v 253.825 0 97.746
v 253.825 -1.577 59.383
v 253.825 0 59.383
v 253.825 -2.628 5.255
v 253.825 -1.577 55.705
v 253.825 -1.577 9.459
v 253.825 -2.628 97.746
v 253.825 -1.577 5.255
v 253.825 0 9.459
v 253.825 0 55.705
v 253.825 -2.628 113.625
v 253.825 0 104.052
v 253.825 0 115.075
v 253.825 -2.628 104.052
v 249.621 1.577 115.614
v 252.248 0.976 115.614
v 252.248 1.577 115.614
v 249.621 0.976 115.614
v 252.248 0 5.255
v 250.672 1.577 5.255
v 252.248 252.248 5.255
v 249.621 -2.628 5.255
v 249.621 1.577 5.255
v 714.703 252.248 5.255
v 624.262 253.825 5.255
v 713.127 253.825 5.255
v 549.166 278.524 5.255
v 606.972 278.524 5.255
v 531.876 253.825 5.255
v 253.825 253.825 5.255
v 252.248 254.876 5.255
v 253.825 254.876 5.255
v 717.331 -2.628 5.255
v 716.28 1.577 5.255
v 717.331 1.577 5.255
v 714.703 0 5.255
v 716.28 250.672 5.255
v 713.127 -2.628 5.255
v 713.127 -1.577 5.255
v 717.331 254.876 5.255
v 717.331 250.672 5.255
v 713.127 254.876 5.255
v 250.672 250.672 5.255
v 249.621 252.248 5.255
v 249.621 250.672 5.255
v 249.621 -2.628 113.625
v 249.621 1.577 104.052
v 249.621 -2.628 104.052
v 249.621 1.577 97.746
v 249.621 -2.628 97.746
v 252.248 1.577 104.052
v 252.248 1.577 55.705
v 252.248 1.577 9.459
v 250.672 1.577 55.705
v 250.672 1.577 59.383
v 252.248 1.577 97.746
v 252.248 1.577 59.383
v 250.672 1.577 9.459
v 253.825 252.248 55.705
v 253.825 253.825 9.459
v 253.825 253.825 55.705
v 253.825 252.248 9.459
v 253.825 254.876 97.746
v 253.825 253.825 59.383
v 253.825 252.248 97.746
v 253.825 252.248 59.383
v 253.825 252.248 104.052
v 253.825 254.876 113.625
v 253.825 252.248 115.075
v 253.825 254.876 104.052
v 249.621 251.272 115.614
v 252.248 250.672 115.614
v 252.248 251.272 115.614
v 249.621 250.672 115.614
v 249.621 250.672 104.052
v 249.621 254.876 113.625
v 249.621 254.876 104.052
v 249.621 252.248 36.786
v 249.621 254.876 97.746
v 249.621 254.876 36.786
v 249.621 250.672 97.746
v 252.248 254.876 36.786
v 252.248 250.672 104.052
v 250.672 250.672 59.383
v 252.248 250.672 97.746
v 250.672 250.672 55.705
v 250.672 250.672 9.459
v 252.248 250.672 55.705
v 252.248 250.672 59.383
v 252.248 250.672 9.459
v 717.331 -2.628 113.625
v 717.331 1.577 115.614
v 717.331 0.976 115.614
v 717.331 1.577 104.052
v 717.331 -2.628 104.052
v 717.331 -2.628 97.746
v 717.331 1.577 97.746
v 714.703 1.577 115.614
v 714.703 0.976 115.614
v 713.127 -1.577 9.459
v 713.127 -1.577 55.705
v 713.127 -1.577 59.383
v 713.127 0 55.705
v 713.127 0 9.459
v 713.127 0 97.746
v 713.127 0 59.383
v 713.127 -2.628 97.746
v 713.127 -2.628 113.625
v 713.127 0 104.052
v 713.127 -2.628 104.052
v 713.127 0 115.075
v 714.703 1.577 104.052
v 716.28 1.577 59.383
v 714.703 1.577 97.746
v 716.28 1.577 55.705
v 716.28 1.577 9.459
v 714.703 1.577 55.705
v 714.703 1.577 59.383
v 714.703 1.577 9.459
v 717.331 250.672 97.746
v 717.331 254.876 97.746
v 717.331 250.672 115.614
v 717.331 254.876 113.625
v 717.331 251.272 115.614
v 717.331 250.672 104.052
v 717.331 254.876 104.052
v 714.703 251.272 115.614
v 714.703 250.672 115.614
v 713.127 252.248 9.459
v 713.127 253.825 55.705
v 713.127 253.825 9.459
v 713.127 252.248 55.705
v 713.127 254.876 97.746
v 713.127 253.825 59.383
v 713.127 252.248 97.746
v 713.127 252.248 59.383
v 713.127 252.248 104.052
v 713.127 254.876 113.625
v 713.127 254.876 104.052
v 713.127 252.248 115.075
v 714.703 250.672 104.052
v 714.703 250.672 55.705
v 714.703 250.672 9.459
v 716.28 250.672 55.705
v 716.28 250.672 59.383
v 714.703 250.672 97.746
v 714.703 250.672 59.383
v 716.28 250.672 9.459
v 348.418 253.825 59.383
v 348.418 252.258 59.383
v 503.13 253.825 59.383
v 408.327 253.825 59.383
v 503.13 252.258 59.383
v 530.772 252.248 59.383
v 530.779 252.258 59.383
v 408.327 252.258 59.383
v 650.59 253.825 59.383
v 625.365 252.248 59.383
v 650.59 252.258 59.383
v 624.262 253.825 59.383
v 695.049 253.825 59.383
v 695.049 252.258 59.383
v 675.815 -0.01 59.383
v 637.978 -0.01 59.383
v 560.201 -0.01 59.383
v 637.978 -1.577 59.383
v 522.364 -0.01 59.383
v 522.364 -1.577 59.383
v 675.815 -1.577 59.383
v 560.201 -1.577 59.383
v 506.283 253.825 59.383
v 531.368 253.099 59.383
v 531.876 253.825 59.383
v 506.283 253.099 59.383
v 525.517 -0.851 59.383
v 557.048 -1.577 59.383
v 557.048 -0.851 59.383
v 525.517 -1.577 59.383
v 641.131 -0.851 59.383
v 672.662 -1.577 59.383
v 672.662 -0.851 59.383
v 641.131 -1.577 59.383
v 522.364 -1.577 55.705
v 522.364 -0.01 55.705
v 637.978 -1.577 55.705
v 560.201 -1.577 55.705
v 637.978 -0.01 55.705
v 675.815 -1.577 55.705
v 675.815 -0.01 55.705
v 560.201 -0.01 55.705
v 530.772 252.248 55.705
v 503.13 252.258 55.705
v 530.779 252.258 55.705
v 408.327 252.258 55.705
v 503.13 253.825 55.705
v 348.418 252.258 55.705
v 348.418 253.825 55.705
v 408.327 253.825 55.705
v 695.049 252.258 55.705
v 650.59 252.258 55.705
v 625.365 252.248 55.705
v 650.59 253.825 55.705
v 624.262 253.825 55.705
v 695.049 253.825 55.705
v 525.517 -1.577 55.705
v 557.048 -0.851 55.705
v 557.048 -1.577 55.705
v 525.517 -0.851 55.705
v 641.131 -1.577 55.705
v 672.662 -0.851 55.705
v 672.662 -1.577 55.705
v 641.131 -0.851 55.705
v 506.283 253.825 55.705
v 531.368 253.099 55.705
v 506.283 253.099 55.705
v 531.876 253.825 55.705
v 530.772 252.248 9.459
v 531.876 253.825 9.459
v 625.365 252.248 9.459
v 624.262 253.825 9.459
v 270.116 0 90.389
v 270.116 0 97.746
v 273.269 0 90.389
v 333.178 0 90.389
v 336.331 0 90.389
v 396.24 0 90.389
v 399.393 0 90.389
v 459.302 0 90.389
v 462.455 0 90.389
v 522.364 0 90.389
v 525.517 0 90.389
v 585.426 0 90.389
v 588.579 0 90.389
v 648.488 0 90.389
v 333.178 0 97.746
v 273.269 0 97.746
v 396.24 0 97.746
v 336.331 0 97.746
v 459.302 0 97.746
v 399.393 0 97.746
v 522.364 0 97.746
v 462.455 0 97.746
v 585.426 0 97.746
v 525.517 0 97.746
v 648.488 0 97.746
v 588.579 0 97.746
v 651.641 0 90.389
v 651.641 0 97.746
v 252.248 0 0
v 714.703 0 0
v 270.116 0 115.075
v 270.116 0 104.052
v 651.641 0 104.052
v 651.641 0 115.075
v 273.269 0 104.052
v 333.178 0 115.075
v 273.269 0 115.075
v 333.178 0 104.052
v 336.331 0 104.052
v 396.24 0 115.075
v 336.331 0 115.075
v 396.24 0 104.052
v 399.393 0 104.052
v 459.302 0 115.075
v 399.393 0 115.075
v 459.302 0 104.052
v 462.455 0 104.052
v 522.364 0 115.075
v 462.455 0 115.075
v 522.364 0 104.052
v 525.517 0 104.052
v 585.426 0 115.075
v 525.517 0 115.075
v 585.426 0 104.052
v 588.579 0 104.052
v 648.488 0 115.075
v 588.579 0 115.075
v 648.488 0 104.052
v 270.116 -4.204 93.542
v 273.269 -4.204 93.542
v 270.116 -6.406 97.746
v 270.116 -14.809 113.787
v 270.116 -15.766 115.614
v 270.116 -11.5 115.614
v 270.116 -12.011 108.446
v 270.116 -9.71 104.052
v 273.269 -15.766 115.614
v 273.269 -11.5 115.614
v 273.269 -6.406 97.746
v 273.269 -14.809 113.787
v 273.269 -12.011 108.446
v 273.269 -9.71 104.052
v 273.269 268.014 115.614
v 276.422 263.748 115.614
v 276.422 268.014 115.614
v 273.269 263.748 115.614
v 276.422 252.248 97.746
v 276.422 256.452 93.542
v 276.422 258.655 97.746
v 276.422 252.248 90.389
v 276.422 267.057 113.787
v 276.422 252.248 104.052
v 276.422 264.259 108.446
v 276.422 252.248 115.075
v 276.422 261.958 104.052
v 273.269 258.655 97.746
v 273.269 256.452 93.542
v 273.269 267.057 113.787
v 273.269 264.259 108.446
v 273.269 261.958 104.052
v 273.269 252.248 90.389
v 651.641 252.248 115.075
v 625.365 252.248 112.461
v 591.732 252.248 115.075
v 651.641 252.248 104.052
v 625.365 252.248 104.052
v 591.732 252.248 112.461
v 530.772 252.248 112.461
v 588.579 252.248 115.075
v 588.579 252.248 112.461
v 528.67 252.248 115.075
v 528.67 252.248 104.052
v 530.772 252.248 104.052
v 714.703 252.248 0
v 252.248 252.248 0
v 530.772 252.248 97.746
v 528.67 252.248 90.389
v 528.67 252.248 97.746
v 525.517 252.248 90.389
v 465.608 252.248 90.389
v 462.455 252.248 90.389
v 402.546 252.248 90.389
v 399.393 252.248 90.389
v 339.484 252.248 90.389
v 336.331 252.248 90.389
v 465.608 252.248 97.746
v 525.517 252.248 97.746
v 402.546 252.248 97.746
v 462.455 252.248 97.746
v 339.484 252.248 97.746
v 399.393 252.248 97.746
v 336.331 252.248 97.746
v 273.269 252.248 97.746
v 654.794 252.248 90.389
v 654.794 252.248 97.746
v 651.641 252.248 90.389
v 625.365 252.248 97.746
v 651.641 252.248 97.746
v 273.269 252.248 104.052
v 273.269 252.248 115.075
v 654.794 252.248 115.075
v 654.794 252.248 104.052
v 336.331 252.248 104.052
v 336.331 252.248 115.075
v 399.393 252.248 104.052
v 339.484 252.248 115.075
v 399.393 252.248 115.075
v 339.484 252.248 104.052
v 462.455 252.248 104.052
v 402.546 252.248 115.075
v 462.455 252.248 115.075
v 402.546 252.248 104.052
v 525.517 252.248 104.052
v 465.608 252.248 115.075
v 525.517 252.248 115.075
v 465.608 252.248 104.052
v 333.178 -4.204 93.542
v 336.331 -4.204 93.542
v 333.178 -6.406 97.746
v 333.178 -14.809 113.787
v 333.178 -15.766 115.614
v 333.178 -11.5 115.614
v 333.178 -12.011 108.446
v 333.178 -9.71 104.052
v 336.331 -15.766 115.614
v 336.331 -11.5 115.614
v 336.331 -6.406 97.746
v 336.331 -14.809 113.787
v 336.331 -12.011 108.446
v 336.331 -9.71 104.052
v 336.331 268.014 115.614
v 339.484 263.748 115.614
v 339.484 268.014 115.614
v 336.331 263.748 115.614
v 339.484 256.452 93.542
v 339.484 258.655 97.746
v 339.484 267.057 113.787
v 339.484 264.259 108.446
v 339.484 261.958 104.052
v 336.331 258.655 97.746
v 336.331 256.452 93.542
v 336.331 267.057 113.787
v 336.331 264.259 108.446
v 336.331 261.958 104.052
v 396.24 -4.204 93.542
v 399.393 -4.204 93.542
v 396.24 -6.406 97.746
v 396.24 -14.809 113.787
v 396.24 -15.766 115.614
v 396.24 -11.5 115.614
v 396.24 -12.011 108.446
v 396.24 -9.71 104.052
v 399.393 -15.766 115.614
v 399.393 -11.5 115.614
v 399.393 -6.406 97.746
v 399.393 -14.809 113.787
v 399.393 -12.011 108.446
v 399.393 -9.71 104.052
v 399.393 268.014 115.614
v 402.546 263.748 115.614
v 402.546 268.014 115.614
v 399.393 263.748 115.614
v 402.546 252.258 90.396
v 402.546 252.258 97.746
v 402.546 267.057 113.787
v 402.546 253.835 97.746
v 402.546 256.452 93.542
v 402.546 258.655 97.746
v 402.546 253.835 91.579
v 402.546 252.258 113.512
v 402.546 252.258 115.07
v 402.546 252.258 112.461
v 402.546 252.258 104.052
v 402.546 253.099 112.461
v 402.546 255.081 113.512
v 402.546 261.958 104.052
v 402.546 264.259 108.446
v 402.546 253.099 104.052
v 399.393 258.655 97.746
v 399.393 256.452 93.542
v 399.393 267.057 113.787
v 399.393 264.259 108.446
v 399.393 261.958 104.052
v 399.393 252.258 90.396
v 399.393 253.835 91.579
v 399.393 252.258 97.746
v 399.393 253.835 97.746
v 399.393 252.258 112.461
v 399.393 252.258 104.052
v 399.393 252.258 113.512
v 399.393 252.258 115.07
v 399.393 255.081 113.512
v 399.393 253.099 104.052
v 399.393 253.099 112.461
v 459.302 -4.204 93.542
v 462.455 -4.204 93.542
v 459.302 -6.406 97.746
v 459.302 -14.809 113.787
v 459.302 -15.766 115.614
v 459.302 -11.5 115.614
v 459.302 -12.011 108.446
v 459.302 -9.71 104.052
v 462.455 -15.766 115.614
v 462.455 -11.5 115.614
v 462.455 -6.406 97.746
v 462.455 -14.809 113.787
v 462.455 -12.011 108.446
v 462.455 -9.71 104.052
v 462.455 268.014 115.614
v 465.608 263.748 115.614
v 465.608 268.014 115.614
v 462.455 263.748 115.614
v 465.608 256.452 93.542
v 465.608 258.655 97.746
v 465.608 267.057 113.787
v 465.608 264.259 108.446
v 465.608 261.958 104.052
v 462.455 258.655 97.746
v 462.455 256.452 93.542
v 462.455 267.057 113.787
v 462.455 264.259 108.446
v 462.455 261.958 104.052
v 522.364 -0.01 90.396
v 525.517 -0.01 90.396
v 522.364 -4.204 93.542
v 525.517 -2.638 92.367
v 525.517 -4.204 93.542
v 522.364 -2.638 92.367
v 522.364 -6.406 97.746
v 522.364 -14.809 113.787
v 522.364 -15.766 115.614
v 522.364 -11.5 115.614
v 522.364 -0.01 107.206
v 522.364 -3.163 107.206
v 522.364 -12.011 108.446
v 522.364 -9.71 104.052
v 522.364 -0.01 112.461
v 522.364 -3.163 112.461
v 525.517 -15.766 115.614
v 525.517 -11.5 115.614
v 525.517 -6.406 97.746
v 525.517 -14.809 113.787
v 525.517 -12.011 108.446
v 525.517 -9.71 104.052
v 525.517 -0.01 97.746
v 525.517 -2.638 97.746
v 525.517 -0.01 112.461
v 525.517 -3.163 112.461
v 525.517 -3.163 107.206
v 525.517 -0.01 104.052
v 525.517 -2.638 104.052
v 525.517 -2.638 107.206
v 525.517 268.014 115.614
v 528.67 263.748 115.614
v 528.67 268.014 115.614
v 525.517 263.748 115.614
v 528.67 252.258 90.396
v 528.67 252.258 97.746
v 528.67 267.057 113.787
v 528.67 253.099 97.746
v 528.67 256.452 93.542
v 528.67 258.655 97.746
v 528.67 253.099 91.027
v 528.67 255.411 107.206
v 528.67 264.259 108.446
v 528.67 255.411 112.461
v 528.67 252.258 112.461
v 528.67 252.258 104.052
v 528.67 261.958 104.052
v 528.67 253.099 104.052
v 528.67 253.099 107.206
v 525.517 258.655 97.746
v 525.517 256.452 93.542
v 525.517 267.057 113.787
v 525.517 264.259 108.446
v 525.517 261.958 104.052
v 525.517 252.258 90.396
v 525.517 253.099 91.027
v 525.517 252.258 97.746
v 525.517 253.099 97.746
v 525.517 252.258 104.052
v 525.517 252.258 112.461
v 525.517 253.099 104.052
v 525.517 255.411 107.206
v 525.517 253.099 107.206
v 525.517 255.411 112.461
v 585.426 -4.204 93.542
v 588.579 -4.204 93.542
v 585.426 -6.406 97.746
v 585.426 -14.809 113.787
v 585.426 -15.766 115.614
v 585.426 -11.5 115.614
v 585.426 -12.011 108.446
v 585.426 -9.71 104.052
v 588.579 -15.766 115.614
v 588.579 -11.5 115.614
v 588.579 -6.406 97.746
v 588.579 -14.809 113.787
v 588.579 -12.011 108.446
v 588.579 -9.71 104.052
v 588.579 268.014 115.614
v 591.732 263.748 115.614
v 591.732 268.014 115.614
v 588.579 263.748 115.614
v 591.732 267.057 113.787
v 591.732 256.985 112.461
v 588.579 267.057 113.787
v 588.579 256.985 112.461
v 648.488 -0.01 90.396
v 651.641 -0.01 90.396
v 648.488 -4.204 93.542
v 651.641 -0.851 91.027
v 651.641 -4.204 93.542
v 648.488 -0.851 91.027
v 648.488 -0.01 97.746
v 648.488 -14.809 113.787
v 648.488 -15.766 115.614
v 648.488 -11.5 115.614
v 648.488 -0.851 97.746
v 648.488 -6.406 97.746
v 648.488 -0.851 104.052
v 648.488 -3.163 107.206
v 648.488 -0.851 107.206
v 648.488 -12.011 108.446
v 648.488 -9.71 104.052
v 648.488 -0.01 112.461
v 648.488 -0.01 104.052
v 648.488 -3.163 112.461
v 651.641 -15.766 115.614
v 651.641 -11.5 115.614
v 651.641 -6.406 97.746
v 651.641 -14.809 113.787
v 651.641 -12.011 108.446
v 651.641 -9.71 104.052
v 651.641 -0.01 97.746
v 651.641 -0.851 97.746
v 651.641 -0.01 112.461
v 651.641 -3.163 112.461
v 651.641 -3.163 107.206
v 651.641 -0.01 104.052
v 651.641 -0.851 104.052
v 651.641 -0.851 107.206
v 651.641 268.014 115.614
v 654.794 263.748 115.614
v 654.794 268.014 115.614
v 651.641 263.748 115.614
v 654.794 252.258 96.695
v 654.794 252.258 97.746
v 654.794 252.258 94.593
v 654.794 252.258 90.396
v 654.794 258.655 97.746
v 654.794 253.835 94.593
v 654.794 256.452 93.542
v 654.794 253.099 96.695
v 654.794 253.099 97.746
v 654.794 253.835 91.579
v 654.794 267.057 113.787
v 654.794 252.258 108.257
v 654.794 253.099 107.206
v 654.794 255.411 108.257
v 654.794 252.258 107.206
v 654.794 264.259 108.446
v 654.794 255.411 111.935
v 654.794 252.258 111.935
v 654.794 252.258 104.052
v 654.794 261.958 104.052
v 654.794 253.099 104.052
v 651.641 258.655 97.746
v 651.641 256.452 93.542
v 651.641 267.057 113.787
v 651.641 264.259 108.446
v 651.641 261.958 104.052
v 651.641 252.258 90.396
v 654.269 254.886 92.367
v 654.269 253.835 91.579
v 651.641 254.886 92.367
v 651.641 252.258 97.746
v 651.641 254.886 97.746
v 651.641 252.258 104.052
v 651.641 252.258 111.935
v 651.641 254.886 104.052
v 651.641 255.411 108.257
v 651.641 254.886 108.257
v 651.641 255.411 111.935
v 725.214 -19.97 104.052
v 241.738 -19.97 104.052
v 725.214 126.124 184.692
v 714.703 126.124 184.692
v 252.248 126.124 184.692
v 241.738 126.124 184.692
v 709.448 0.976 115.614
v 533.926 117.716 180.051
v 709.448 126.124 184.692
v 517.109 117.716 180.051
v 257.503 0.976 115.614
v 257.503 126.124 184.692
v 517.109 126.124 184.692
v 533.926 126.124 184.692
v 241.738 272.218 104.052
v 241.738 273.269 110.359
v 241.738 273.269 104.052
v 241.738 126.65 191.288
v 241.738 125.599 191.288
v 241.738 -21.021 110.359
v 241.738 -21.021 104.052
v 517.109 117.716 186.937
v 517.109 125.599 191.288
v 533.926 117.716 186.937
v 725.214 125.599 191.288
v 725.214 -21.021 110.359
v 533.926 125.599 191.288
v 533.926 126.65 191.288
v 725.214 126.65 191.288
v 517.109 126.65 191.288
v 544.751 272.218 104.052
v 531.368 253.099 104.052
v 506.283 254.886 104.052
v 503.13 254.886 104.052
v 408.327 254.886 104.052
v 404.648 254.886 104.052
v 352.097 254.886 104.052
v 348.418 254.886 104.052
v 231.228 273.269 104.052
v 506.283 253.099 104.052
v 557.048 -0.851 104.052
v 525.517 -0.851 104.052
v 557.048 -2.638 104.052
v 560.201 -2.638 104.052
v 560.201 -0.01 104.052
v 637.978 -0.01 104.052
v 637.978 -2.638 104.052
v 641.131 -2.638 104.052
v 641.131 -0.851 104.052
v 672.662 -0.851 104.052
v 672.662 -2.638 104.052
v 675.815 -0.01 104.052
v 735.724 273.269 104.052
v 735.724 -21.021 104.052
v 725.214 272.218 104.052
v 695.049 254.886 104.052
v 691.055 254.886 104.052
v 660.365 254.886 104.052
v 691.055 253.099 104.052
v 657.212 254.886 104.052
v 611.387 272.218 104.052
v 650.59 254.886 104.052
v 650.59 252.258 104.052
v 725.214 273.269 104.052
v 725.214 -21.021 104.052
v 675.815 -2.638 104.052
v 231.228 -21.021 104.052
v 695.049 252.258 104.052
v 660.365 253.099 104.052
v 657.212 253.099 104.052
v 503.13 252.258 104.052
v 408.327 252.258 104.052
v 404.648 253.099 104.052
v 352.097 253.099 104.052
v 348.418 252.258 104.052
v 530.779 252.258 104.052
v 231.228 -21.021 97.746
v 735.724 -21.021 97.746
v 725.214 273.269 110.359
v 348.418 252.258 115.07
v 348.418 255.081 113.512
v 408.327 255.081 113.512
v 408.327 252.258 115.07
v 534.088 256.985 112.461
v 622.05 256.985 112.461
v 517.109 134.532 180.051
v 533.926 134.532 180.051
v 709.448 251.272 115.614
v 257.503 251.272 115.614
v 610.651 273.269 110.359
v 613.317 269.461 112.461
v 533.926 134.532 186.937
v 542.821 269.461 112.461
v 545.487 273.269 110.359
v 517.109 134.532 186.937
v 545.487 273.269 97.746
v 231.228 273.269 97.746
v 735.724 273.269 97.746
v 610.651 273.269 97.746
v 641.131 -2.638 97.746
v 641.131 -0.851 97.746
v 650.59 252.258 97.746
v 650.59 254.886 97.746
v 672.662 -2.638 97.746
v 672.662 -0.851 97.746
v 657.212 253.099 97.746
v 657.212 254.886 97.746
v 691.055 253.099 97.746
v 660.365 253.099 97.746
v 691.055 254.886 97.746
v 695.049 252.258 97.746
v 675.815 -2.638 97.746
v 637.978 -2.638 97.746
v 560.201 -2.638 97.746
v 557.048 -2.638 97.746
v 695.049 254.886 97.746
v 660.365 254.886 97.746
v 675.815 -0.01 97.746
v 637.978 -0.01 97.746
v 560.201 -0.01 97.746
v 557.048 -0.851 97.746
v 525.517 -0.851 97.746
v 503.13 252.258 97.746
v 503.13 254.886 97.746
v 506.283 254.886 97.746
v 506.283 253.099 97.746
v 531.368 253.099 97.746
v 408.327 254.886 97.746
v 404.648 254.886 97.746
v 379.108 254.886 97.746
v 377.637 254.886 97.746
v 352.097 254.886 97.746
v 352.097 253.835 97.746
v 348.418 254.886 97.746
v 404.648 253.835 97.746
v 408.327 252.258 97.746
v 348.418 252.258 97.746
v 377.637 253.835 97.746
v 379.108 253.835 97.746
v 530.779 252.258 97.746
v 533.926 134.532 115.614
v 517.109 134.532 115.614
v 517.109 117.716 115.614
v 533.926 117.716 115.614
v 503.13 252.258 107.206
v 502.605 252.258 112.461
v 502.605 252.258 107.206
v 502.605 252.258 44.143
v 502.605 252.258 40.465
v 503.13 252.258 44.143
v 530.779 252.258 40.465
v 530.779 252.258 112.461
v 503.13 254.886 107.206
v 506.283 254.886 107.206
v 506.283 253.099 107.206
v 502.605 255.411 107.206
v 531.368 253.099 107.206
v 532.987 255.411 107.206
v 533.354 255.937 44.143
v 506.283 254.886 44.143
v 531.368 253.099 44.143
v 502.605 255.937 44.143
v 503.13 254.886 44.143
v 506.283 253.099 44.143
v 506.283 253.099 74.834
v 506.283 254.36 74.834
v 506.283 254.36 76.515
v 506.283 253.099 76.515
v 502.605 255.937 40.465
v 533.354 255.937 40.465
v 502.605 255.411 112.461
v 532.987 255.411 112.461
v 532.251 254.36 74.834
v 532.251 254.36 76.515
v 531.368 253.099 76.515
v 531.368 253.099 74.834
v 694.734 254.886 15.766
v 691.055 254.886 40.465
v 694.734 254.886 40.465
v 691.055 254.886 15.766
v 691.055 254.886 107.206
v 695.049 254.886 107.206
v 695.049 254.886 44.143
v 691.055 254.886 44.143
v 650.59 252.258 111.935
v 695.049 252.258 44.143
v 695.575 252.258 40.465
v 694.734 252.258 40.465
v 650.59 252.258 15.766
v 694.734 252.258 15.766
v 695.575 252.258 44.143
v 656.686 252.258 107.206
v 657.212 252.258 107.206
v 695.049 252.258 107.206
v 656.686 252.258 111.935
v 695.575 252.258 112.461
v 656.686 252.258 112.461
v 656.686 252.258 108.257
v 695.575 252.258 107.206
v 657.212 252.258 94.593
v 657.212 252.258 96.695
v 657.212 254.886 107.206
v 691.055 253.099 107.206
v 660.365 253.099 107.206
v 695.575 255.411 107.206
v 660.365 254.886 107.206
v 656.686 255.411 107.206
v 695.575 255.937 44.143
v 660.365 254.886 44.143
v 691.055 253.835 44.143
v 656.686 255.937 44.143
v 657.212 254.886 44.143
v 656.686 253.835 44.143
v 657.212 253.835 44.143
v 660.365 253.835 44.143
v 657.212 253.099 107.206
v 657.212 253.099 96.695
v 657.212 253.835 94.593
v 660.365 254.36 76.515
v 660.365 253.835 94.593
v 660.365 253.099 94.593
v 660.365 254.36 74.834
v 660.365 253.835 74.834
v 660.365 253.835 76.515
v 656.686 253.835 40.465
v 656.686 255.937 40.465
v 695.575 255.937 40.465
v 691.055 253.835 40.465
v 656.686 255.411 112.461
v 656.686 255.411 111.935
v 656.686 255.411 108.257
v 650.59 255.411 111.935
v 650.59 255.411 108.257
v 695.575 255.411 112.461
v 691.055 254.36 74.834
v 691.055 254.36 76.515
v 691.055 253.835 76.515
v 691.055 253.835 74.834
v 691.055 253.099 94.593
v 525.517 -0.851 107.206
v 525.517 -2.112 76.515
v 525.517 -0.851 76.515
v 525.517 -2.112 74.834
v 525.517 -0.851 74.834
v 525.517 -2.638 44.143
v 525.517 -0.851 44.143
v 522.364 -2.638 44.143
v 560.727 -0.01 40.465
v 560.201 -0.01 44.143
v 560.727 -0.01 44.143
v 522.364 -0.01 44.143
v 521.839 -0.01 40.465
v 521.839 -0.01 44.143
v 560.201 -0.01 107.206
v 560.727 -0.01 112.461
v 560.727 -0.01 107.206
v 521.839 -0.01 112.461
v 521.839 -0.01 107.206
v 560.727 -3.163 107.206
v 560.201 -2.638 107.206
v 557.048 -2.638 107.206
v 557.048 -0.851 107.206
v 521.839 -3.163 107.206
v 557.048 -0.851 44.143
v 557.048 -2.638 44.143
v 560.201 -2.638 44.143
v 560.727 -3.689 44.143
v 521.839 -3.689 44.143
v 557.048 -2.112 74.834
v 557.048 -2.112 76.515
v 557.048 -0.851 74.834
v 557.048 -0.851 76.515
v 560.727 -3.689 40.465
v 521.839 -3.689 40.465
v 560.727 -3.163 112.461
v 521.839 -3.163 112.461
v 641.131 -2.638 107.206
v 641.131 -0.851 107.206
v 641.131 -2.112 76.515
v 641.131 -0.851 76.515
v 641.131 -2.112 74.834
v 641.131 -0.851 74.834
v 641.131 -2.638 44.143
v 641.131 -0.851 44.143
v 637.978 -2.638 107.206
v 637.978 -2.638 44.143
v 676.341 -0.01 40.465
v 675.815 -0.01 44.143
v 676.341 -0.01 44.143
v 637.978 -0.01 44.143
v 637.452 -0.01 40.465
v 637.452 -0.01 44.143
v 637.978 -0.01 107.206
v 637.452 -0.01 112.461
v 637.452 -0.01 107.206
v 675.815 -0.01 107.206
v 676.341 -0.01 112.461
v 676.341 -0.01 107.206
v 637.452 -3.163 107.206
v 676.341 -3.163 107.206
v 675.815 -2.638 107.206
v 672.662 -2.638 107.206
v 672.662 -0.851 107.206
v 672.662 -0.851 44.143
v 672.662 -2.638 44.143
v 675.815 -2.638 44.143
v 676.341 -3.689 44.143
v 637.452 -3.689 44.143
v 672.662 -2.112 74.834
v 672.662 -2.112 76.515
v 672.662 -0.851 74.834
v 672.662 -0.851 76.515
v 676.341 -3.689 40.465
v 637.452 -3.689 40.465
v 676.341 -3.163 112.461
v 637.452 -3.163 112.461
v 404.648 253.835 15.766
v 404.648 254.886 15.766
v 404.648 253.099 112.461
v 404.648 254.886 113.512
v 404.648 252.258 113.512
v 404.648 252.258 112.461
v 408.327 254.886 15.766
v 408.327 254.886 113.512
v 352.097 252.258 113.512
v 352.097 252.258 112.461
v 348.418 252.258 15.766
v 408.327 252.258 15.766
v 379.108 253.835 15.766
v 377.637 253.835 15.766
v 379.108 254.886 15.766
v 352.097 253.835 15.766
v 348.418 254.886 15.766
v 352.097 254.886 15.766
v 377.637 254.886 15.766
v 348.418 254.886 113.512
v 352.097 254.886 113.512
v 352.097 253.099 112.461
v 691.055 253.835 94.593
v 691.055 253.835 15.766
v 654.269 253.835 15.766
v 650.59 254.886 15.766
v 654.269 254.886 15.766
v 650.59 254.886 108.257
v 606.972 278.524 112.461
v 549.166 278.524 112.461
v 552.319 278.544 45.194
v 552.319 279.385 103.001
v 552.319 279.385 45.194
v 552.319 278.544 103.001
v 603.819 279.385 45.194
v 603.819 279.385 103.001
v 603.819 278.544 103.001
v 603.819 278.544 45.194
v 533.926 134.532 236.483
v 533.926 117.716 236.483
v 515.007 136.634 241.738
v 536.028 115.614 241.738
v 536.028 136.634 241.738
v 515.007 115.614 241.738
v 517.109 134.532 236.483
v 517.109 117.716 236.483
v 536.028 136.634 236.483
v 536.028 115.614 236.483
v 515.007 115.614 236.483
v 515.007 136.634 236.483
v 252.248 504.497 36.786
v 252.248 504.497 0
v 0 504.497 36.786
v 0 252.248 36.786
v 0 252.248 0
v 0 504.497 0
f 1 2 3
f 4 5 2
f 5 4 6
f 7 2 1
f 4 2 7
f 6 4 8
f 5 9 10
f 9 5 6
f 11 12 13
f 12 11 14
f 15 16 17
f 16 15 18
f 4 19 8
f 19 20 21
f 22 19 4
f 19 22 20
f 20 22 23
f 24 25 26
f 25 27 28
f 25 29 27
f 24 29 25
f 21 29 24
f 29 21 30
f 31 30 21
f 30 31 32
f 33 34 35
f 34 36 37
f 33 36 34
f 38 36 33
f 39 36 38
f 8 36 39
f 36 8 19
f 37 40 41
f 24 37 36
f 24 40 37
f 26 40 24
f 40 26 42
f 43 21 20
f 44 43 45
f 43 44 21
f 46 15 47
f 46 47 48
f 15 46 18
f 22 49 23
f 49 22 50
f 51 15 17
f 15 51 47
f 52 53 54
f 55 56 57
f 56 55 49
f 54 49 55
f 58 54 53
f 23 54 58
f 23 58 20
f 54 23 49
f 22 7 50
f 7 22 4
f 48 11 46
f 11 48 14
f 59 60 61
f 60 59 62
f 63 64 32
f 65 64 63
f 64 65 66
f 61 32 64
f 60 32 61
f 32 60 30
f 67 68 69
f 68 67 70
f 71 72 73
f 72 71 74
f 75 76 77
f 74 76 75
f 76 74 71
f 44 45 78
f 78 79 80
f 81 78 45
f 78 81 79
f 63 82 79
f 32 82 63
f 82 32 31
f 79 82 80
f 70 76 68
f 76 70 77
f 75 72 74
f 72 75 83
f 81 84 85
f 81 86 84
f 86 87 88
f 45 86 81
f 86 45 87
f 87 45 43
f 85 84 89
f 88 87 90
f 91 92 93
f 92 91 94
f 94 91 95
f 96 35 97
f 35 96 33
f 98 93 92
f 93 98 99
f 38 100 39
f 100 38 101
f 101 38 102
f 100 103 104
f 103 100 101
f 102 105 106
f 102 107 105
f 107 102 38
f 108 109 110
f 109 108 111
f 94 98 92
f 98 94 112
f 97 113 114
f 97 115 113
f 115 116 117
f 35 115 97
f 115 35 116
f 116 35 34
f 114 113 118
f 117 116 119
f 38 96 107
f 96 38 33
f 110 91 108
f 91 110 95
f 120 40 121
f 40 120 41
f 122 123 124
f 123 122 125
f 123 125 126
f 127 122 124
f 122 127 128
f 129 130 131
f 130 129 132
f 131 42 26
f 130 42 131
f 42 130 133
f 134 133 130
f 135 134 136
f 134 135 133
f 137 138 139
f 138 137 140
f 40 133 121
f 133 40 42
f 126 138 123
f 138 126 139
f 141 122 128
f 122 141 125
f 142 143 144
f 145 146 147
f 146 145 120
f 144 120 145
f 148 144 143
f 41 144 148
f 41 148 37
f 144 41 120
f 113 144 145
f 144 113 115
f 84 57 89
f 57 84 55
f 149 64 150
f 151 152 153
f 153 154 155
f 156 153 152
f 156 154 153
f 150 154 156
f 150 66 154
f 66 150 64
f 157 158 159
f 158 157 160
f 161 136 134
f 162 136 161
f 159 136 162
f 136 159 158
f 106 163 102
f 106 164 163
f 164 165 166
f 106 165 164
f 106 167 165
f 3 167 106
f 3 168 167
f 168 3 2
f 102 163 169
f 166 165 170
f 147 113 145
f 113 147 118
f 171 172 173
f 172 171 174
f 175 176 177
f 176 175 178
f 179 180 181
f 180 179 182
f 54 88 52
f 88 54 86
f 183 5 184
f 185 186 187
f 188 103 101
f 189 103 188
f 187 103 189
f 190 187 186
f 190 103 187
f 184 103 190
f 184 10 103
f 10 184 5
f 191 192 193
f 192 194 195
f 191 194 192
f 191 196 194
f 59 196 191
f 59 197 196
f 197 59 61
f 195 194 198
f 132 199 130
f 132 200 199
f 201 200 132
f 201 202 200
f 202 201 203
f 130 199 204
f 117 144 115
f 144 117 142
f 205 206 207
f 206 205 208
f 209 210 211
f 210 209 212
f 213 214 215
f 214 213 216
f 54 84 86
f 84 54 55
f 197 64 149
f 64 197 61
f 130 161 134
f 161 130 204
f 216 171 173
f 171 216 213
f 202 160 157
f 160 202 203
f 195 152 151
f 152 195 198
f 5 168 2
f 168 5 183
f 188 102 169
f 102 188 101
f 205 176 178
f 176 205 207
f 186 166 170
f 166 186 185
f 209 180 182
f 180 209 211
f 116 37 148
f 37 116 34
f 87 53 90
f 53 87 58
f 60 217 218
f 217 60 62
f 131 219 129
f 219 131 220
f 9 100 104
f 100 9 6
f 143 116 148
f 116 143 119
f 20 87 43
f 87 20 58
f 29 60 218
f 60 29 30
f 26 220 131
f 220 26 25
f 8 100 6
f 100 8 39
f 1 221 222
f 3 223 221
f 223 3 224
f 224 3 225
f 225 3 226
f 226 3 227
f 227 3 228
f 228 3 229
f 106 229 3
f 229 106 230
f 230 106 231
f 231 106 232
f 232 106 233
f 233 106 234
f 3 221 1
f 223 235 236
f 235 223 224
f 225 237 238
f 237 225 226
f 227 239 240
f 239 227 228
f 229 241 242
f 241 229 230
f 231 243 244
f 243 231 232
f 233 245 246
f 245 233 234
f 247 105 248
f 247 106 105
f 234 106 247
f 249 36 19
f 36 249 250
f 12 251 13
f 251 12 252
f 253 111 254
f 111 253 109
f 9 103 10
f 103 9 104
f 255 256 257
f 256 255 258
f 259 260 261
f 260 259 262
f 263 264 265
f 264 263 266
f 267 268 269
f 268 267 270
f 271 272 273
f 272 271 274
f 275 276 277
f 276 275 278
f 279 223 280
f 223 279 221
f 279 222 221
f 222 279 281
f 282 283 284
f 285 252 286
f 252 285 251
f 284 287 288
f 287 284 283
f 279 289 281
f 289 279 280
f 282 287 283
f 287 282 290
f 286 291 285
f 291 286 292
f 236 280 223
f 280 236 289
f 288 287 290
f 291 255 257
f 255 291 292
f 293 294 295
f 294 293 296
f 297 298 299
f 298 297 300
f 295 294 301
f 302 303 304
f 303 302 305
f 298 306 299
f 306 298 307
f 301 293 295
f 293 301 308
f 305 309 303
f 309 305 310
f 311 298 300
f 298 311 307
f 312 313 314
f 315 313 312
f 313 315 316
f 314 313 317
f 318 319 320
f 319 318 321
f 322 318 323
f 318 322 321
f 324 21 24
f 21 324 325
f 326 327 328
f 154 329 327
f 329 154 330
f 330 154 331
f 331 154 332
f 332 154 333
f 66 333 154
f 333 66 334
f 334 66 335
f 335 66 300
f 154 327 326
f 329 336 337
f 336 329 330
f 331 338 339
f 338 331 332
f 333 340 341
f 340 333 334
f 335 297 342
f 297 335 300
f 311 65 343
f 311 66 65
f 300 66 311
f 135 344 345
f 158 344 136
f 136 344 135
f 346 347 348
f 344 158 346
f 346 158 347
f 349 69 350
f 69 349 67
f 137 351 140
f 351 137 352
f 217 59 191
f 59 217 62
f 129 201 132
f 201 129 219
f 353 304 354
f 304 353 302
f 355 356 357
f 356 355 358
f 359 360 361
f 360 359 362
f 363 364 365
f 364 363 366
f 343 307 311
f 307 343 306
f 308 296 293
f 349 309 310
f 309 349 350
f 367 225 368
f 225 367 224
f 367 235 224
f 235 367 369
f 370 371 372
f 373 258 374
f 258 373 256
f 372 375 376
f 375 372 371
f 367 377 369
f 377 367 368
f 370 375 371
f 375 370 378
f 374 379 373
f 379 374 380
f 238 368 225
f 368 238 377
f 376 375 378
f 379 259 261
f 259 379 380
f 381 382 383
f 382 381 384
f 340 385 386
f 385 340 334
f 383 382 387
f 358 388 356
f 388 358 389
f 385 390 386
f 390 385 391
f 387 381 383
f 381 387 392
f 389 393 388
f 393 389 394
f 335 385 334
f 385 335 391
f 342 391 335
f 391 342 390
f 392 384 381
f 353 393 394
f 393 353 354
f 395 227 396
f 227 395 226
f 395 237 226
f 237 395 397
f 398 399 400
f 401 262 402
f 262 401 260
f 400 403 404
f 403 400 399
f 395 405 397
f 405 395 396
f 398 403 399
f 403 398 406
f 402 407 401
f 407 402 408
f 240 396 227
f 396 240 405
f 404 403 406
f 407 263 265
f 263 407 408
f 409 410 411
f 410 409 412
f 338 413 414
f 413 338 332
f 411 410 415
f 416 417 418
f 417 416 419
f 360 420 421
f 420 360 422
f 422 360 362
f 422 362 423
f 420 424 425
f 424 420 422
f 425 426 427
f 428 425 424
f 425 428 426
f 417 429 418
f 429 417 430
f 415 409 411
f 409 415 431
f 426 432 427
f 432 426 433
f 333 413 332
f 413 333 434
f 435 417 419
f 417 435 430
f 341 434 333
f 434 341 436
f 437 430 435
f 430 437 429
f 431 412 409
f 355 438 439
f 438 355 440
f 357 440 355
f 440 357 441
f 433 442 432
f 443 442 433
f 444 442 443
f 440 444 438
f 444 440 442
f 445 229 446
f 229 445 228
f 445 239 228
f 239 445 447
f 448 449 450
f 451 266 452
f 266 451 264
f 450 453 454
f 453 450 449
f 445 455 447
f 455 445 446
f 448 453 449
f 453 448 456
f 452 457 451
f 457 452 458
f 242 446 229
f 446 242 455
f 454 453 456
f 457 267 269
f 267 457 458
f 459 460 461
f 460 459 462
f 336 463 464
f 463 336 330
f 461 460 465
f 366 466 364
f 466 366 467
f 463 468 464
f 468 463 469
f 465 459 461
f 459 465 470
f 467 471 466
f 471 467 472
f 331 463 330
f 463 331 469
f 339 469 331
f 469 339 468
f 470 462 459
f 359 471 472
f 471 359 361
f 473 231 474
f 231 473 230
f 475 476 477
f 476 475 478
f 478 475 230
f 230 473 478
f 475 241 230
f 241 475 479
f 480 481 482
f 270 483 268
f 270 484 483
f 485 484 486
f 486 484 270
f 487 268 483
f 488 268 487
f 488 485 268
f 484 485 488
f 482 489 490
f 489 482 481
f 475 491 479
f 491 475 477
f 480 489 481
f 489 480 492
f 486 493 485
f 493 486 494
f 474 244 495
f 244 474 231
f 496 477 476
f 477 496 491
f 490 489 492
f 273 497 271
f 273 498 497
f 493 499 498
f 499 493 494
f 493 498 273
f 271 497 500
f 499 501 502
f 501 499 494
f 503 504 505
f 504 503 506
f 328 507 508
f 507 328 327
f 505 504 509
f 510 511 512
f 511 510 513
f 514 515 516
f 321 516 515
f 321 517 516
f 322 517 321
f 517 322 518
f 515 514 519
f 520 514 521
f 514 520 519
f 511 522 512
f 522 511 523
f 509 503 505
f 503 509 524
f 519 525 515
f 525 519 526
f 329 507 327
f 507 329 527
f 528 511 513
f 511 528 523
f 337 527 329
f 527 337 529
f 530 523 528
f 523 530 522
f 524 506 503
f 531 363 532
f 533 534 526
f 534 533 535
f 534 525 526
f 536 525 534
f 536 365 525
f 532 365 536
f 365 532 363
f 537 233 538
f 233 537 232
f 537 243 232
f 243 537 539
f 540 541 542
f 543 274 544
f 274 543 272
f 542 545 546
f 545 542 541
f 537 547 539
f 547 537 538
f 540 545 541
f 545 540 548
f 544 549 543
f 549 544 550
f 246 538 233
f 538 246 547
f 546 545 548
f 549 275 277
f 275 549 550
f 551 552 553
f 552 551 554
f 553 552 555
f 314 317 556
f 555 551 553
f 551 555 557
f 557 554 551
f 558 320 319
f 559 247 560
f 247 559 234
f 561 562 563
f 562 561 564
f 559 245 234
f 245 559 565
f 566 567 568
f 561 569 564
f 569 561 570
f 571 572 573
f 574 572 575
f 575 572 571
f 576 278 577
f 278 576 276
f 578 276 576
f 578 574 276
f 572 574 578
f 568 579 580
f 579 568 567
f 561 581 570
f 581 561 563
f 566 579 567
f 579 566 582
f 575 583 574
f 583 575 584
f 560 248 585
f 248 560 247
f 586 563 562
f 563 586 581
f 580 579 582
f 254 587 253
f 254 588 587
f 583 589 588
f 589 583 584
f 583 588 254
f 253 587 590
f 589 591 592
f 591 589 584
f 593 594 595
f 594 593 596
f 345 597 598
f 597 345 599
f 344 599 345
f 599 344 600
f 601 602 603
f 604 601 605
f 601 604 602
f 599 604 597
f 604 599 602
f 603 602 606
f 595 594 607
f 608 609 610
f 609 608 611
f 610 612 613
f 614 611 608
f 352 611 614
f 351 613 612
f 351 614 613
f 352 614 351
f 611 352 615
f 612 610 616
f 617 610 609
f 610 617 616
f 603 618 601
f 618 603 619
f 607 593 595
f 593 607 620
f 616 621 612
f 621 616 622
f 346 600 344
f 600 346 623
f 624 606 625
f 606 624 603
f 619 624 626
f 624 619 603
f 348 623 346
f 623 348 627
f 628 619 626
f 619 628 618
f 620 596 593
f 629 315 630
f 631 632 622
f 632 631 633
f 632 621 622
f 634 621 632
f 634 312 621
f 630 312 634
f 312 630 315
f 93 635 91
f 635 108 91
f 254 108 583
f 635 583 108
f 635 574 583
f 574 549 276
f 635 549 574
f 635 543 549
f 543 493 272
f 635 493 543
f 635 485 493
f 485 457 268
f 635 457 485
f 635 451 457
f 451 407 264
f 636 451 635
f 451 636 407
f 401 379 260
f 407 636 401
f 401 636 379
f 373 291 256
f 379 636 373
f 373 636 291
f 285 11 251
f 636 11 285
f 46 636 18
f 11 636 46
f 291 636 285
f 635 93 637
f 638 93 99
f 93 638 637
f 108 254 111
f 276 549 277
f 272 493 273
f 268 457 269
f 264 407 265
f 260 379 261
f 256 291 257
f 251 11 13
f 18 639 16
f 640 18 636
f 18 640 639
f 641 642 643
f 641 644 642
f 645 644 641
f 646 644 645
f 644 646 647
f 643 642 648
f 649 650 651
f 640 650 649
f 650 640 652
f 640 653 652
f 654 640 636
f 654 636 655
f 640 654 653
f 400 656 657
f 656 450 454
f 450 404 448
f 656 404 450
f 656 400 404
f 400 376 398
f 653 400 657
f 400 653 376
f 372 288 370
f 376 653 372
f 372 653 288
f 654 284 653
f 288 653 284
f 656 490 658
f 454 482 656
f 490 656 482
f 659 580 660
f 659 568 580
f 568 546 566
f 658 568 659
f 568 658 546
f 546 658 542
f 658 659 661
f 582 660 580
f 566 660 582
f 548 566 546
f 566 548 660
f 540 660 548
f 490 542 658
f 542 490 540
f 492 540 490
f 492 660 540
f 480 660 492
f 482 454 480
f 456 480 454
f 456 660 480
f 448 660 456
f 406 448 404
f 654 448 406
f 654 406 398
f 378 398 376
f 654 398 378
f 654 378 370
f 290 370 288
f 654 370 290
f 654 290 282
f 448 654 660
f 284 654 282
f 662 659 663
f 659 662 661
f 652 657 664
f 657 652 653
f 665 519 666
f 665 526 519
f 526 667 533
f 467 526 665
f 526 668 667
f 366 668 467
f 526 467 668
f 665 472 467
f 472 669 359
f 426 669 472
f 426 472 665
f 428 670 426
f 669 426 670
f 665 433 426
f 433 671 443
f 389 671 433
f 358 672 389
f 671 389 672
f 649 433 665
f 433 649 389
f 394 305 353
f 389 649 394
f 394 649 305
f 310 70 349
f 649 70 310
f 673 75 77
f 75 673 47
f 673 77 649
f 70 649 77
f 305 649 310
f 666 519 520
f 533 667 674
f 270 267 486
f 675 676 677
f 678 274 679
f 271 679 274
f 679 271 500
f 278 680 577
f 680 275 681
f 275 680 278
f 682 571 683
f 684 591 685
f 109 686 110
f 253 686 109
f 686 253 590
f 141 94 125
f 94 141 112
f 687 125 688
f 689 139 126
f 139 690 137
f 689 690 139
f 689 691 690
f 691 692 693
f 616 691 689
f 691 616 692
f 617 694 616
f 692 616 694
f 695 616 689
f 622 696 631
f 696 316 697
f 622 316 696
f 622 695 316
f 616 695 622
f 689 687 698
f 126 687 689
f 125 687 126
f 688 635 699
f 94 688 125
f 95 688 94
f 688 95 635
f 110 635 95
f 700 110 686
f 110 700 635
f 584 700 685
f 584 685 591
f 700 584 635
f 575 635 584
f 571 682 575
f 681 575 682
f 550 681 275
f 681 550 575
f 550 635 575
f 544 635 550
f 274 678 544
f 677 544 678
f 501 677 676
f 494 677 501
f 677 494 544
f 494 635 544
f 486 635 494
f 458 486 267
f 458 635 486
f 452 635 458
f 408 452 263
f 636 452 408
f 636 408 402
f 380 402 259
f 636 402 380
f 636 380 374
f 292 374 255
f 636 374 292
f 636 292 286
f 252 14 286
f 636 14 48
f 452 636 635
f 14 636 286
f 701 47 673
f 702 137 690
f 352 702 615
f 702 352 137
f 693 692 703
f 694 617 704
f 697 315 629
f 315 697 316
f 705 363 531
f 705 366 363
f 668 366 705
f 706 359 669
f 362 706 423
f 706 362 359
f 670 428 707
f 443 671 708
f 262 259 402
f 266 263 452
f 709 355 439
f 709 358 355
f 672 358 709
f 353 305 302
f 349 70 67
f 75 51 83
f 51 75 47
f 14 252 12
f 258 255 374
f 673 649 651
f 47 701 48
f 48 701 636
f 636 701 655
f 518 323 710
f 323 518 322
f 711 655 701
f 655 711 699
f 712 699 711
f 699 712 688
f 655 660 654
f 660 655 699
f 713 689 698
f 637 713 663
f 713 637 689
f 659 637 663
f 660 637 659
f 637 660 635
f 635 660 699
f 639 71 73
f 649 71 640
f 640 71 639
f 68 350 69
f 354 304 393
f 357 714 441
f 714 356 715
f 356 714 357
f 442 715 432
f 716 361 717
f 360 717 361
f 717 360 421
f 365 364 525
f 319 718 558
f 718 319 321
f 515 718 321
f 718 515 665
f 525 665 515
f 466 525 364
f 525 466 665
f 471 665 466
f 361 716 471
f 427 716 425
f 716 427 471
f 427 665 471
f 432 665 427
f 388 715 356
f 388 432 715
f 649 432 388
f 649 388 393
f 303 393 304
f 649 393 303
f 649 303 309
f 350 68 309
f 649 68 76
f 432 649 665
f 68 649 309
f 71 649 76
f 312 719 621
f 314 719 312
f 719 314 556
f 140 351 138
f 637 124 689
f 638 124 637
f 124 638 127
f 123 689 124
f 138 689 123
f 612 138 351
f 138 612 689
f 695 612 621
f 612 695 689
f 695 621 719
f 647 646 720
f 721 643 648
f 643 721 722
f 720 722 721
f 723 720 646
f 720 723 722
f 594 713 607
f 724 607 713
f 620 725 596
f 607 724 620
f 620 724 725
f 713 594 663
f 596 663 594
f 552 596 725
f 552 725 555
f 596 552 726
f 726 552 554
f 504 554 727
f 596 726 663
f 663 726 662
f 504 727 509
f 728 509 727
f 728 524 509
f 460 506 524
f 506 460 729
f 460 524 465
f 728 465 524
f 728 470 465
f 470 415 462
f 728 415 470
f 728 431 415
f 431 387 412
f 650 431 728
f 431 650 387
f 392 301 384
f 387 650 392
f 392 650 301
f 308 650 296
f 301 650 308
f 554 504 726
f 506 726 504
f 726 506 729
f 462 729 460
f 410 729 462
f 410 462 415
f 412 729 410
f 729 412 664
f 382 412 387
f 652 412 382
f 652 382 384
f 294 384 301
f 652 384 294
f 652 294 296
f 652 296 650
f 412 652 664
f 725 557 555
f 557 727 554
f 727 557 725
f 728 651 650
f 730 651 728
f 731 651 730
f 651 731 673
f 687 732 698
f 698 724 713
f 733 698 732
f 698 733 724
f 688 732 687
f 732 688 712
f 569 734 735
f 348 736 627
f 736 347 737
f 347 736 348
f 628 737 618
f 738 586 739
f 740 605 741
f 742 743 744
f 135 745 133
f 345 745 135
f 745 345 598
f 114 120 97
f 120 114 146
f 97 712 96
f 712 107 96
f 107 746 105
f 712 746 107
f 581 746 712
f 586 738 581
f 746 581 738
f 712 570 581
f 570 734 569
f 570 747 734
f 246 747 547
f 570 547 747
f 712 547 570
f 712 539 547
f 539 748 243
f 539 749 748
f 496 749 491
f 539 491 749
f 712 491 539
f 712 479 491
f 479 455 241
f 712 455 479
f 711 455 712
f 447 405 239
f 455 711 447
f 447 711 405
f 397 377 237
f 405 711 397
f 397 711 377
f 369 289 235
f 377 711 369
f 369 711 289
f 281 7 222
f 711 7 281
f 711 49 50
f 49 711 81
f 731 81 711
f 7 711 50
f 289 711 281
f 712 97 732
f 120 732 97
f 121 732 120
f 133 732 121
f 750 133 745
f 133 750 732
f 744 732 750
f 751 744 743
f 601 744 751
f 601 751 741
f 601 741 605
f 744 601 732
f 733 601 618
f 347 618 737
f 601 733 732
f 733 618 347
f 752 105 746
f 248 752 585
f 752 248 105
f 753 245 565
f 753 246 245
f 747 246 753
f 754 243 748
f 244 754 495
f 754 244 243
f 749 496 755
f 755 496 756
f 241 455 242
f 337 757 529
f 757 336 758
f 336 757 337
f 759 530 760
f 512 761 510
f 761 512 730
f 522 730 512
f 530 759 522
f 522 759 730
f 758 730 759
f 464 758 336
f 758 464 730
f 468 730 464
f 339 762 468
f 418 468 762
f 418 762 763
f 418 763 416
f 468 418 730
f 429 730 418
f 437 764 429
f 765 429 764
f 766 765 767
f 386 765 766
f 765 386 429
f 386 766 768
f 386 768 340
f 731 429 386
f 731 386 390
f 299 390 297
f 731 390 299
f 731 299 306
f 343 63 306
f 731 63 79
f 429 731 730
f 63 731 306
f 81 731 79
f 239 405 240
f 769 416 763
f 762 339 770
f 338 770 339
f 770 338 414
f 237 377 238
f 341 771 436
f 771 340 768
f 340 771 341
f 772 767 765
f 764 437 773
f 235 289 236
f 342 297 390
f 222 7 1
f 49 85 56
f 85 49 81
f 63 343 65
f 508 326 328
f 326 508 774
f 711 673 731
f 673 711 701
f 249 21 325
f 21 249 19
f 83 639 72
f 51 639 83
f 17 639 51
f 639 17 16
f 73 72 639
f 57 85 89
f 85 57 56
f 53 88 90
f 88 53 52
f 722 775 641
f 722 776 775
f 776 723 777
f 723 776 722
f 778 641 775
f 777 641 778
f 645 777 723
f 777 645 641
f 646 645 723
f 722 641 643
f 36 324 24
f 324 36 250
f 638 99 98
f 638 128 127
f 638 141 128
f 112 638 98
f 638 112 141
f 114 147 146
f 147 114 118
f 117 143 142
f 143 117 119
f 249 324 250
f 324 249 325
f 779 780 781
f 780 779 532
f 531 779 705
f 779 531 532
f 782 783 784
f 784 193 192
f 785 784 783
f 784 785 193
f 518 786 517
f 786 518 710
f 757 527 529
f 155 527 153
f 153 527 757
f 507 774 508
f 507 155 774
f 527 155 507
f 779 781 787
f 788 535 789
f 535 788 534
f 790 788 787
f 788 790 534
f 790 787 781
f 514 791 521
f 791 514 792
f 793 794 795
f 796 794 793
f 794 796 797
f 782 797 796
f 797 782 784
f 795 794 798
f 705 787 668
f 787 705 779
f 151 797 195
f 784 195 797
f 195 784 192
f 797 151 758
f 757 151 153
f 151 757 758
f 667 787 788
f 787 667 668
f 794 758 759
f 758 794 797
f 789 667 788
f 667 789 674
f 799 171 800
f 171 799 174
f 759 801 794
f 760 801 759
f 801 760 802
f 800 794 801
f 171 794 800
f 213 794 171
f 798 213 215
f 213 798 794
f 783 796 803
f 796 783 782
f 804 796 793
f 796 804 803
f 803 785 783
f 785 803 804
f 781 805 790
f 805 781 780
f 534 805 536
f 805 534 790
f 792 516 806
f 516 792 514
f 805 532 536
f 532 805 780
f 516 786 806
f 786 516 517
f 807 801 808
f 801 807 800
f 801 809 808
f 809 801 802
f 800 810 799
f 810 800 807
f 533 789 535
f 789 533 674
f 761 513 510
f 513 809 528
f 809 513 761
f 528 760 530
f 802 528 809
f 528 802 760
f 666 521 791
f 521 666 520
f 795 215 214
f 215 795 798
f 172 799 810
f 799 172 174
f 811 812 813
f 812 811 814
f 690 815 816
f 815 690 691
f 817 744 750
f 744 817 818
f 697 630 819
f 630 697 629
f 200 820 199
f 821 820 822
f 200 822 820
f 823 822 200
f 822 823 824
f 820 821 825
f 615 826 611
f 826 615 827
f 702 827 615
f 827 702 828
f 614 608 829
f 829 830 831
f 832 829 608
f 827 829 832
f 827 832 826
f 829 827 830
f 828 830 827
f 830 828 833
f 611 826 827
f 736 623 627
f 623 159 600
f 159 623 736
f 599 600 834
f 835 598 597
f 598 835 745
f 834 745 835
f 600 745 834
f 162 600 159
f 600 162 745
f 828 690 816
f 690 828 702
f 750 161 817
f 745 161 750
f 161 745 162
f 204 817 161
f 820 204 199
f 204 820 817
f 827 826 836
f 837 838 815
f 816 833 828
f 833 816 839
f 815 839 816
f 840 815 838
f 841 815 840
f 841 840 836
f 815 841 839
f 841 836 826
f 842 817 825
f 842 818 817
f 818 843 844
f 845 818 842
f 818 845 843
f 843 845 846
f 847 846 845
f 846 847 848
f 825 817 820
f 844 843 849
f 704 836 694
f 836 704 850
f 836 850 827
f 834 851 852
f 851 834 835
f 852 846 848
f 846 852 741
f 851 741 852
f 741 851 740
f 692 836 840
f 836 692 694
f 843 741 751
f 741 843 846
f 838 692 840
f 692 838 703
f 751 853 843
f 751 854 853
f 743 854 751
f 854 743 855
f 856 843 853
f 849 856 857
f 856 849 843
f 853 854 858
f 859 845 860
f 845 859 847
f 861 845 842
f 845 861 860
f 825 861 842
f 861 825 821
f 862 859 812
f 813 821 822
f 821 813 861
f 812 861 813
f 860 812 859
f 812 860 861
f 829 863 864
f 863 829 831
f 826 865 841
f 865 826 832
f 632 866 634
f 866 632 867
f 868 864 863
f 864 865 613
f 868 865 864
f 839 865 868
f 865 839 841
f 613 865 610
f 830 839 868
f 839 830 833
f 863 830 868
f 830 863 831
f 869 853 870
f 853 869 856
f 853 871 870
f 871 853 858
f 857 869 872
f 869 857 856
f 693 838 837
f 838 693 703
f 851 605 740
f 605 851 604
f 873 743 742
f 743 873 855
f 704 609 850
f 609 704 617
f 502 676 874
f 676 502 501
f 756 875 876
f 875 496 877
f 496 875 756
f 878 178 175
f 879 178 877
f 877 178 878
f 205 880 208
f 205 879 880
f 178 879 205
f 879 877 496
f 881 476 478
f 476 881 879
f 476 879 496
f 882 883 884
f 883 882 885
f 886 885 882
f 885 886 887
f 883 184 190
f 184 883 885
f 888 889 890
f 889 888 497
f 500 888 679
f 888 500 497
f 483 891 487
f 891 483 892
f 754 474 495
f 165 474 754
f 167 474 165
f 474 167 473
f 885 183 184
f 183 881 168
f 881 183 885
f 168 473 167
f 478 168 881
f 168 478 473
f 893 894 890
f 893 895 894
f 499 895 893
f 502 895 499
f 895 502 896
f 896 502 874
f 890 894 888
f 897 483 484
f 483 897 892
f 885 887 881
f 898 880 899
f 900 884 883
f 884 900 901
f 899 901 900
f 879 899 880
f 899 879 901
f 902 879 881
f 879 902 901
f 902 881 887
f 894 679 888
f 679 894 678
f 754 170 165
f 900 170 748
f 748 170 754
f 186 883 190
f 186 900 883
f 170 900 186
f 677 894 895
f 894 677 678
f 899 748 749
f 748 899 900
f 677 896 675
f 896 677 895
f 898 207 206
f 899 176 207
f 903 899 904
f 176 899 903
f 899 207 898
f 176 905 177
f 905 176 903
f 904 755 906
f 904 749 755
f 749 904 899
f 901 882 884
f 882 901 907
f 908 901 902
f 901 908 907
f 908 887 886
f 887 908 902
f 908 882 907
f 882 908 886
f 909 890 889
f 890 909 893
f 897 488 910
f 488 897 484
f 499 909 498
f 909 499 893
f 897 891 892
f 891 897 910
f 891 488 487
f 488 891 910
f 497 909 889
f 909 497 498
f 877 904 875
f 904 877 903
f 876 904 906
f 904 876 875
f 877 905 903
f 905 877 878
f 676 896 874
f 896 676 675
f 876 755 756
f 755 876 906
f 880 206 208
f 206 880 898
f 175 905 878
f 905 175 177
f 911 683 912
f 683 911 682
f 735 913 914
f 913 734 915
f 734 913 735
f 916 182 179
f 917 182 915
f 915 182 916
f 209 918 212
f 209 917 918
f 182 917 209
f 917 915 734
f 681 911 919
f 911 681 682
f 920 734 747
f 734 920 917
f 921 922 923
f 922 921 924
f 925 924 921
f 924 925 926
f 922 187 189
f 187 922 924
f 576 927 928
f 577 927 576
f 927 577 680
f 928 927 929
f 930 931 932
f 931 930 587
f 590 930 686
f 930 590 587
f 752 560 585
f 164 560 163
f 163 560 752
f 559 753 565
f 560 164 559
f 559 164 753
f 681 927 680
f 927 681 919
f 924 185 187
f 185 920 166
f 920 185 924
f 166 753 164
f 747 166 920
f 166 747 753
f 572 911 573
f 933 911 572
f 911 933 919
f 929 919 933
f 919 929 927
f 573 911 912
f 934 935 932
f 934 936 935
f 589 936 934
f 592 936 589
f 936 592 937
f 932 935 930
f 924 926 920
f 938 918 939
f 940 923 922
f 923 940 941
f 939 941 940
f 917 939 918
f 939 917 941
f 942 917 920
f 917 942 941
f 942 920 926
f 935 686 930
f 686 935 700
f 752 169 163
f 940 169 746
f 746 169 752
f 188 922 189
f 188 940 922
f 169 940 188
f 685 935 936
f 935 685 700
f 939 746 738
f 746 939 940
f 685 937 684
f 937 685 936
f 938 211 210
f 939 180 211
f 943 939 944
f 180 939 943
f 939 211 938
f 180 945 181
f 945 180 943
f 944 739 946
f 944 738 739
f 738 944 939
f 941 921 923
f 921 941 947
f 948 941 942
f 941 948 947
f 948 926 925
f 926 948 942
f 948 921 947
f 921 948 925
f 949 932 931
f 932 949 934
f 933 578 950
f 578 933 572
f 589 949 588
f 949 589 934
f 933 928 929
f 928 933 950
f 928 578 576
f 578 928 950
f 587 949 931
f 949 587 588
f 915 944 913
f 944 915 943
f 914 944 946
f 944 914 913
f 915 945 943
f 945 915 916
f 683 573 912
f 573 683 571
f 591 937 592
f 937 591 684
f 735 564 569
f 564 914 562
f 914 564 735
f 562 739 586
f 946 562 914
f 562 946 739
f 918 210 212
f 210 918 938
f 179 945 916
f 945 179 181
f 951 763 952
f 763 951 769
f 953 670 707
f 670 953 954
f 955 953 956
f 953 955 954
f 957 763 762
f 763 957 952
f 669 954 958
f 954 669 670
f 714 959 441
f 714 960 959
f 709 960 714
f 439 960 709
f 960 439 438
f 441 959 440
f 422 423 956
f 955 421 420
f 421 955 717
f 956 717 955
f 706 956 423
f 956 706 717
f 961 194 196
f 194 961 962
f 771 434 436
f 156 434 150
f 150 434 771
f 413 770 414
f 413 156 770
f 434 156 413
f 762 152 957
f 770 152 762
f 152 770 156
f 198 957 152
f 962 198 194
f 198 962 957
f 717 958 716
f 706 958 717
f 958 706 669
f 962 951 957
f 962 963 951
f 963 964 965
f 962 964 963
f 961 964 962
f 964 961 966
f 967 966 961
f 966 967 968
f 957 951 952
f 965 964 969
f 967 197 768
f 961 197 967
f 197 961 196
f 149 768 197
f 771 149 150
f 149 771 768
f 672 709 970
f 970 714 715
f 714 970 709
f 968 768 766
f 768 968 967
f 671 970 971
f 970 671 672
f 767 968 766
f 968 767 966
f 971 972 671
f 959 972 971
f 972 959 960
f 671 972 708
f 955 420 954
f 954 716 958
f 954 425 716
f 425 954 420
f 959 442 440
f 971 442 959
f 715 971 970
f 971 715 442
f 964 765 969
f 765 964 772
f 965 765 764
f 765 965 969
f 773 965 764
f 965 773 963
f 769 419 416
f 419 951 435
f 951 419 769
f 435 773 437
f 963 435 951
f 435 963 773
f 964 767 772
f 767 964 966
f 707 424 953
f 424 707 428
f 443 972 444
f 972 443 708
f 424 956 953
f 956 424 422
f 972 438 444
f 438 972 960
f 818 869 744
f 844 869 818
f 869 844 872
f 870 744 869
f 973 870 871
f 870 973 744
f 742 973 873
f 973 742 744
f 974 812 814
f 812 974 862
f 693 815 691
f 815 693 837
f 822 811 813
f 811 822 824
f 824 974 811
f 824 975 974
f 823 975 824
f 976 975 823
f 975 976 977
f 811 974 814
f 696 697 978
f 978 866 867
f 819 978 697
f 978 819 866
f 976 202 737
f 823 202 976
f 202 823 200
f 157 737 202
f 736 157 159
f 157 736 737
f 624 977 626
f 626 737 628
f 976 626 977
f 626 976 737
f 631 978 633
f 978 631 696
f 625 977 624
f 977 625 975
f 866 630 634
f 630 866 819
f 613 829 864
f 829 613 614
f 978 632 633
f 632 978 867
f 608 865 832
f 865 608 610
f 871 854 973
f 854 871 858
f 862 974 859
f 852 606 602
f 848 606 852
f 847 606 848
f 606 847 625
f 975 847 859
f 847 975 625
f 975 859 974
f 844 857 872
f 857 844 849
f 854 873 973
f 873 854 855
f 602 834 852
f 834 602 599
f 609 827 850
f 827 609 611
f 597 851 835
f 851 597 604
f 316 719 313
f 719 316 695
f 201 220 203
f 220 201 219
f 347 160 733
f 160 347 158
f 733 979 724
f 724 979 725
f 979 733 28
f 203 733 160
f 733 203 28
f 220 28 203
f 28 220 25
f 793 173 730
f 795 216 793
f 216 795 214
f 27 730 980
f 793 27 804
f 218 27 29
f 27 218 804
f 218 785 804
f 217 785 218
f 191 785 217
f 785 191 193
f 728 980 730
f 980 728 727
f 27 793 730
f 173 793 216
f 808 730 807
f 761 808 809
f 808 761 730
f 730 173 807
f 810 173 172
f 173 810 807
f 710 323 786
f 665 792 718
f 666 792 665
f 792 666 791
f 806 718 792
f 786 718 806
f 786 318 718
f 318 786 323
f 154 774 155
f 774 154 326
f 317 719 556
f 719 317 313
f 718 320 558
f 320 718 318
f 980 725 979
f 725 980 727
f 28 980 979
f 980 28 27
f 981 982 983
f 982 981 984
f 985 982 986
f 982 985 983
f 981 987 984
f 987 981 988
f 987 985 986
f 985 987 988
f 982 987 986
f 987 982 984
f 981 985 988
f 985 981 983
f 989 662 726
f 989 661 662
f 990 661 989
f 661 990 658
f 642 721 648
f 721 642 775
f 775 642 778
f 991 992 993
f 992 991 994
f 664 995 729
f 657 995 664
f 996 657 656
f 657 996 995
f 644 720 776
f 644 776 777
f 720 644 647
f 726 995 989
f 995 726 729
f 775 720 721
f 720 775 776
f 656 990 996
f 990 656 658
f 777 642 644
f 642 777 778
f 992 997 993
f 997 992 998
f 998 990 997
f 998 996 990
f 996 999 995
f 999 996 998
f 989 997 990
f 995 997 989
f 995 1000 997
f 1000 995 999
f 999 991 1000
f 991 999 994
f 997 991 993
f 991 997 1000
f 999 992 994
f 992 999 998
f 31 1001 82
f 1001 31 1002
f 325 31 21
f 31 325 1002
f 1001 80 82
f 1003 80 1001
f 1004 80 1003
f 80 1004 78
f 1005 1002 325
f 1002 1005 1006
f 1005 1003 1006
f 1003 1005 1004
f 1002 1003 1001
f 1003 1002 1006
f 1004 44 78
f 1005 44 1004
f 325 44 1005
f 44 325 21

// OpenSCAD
// =====================================================================
//  MILWAUKEE ROAD - JUDA, WIS. PASSENGER STATION
//  Source: Album sheet 124, drawing B-?, June 1 1928.  Drawings are private reference (in copyright):
//  Research Library / RSW / Stations / Standard depots / Album of Depot Plans 1919.
//  Rib Side Works, 24 Nov 2026. FIRST SHAPE MODEL for review - not cut into print sections.
//  KNOWN (from the sheet): 44 x 24 ft depot + 24 ft exterior high platform; baggage and freight room, waiting room, ticket office with bay; drop siding, gable roof.
//  ESTIMATE: wall and ridge heights where not written, window count and spacing, colours.
//  Built with the shared depot builder ../../../_common/rsw_depot.scad (x along the track,
//  y = 0 town side, track side +y, feet).  SCALE: 29 = G, 48 = O, 87 = HO.
// =====================================================================
SCALE = 29;
include <../../../_common/rsw_depot.scad>

depot(blocks = [[24, 44, 0, 24, 11, 0.55, 1, 2, 0]],
      pavs   = [],
      wins   = [[49.67, 1, 3, 6, 4.2], [57.0, 1, 3, 6, 4.2], [64.33, 1, 3, 6, 4.2], [51.5, 0, 3, 6, 4.2], [62.5, 0, 3, 6, 4.2]],
      doors  = [[36, 1, 5, 8, 1], [64, 1, 3.5, 7.5, 0]],
      bays   = [[55, 1, 9, 2.5]],
      chims  = [[50, 12, 23]],
      plat   = [0, 24, 24, 3.5]);
